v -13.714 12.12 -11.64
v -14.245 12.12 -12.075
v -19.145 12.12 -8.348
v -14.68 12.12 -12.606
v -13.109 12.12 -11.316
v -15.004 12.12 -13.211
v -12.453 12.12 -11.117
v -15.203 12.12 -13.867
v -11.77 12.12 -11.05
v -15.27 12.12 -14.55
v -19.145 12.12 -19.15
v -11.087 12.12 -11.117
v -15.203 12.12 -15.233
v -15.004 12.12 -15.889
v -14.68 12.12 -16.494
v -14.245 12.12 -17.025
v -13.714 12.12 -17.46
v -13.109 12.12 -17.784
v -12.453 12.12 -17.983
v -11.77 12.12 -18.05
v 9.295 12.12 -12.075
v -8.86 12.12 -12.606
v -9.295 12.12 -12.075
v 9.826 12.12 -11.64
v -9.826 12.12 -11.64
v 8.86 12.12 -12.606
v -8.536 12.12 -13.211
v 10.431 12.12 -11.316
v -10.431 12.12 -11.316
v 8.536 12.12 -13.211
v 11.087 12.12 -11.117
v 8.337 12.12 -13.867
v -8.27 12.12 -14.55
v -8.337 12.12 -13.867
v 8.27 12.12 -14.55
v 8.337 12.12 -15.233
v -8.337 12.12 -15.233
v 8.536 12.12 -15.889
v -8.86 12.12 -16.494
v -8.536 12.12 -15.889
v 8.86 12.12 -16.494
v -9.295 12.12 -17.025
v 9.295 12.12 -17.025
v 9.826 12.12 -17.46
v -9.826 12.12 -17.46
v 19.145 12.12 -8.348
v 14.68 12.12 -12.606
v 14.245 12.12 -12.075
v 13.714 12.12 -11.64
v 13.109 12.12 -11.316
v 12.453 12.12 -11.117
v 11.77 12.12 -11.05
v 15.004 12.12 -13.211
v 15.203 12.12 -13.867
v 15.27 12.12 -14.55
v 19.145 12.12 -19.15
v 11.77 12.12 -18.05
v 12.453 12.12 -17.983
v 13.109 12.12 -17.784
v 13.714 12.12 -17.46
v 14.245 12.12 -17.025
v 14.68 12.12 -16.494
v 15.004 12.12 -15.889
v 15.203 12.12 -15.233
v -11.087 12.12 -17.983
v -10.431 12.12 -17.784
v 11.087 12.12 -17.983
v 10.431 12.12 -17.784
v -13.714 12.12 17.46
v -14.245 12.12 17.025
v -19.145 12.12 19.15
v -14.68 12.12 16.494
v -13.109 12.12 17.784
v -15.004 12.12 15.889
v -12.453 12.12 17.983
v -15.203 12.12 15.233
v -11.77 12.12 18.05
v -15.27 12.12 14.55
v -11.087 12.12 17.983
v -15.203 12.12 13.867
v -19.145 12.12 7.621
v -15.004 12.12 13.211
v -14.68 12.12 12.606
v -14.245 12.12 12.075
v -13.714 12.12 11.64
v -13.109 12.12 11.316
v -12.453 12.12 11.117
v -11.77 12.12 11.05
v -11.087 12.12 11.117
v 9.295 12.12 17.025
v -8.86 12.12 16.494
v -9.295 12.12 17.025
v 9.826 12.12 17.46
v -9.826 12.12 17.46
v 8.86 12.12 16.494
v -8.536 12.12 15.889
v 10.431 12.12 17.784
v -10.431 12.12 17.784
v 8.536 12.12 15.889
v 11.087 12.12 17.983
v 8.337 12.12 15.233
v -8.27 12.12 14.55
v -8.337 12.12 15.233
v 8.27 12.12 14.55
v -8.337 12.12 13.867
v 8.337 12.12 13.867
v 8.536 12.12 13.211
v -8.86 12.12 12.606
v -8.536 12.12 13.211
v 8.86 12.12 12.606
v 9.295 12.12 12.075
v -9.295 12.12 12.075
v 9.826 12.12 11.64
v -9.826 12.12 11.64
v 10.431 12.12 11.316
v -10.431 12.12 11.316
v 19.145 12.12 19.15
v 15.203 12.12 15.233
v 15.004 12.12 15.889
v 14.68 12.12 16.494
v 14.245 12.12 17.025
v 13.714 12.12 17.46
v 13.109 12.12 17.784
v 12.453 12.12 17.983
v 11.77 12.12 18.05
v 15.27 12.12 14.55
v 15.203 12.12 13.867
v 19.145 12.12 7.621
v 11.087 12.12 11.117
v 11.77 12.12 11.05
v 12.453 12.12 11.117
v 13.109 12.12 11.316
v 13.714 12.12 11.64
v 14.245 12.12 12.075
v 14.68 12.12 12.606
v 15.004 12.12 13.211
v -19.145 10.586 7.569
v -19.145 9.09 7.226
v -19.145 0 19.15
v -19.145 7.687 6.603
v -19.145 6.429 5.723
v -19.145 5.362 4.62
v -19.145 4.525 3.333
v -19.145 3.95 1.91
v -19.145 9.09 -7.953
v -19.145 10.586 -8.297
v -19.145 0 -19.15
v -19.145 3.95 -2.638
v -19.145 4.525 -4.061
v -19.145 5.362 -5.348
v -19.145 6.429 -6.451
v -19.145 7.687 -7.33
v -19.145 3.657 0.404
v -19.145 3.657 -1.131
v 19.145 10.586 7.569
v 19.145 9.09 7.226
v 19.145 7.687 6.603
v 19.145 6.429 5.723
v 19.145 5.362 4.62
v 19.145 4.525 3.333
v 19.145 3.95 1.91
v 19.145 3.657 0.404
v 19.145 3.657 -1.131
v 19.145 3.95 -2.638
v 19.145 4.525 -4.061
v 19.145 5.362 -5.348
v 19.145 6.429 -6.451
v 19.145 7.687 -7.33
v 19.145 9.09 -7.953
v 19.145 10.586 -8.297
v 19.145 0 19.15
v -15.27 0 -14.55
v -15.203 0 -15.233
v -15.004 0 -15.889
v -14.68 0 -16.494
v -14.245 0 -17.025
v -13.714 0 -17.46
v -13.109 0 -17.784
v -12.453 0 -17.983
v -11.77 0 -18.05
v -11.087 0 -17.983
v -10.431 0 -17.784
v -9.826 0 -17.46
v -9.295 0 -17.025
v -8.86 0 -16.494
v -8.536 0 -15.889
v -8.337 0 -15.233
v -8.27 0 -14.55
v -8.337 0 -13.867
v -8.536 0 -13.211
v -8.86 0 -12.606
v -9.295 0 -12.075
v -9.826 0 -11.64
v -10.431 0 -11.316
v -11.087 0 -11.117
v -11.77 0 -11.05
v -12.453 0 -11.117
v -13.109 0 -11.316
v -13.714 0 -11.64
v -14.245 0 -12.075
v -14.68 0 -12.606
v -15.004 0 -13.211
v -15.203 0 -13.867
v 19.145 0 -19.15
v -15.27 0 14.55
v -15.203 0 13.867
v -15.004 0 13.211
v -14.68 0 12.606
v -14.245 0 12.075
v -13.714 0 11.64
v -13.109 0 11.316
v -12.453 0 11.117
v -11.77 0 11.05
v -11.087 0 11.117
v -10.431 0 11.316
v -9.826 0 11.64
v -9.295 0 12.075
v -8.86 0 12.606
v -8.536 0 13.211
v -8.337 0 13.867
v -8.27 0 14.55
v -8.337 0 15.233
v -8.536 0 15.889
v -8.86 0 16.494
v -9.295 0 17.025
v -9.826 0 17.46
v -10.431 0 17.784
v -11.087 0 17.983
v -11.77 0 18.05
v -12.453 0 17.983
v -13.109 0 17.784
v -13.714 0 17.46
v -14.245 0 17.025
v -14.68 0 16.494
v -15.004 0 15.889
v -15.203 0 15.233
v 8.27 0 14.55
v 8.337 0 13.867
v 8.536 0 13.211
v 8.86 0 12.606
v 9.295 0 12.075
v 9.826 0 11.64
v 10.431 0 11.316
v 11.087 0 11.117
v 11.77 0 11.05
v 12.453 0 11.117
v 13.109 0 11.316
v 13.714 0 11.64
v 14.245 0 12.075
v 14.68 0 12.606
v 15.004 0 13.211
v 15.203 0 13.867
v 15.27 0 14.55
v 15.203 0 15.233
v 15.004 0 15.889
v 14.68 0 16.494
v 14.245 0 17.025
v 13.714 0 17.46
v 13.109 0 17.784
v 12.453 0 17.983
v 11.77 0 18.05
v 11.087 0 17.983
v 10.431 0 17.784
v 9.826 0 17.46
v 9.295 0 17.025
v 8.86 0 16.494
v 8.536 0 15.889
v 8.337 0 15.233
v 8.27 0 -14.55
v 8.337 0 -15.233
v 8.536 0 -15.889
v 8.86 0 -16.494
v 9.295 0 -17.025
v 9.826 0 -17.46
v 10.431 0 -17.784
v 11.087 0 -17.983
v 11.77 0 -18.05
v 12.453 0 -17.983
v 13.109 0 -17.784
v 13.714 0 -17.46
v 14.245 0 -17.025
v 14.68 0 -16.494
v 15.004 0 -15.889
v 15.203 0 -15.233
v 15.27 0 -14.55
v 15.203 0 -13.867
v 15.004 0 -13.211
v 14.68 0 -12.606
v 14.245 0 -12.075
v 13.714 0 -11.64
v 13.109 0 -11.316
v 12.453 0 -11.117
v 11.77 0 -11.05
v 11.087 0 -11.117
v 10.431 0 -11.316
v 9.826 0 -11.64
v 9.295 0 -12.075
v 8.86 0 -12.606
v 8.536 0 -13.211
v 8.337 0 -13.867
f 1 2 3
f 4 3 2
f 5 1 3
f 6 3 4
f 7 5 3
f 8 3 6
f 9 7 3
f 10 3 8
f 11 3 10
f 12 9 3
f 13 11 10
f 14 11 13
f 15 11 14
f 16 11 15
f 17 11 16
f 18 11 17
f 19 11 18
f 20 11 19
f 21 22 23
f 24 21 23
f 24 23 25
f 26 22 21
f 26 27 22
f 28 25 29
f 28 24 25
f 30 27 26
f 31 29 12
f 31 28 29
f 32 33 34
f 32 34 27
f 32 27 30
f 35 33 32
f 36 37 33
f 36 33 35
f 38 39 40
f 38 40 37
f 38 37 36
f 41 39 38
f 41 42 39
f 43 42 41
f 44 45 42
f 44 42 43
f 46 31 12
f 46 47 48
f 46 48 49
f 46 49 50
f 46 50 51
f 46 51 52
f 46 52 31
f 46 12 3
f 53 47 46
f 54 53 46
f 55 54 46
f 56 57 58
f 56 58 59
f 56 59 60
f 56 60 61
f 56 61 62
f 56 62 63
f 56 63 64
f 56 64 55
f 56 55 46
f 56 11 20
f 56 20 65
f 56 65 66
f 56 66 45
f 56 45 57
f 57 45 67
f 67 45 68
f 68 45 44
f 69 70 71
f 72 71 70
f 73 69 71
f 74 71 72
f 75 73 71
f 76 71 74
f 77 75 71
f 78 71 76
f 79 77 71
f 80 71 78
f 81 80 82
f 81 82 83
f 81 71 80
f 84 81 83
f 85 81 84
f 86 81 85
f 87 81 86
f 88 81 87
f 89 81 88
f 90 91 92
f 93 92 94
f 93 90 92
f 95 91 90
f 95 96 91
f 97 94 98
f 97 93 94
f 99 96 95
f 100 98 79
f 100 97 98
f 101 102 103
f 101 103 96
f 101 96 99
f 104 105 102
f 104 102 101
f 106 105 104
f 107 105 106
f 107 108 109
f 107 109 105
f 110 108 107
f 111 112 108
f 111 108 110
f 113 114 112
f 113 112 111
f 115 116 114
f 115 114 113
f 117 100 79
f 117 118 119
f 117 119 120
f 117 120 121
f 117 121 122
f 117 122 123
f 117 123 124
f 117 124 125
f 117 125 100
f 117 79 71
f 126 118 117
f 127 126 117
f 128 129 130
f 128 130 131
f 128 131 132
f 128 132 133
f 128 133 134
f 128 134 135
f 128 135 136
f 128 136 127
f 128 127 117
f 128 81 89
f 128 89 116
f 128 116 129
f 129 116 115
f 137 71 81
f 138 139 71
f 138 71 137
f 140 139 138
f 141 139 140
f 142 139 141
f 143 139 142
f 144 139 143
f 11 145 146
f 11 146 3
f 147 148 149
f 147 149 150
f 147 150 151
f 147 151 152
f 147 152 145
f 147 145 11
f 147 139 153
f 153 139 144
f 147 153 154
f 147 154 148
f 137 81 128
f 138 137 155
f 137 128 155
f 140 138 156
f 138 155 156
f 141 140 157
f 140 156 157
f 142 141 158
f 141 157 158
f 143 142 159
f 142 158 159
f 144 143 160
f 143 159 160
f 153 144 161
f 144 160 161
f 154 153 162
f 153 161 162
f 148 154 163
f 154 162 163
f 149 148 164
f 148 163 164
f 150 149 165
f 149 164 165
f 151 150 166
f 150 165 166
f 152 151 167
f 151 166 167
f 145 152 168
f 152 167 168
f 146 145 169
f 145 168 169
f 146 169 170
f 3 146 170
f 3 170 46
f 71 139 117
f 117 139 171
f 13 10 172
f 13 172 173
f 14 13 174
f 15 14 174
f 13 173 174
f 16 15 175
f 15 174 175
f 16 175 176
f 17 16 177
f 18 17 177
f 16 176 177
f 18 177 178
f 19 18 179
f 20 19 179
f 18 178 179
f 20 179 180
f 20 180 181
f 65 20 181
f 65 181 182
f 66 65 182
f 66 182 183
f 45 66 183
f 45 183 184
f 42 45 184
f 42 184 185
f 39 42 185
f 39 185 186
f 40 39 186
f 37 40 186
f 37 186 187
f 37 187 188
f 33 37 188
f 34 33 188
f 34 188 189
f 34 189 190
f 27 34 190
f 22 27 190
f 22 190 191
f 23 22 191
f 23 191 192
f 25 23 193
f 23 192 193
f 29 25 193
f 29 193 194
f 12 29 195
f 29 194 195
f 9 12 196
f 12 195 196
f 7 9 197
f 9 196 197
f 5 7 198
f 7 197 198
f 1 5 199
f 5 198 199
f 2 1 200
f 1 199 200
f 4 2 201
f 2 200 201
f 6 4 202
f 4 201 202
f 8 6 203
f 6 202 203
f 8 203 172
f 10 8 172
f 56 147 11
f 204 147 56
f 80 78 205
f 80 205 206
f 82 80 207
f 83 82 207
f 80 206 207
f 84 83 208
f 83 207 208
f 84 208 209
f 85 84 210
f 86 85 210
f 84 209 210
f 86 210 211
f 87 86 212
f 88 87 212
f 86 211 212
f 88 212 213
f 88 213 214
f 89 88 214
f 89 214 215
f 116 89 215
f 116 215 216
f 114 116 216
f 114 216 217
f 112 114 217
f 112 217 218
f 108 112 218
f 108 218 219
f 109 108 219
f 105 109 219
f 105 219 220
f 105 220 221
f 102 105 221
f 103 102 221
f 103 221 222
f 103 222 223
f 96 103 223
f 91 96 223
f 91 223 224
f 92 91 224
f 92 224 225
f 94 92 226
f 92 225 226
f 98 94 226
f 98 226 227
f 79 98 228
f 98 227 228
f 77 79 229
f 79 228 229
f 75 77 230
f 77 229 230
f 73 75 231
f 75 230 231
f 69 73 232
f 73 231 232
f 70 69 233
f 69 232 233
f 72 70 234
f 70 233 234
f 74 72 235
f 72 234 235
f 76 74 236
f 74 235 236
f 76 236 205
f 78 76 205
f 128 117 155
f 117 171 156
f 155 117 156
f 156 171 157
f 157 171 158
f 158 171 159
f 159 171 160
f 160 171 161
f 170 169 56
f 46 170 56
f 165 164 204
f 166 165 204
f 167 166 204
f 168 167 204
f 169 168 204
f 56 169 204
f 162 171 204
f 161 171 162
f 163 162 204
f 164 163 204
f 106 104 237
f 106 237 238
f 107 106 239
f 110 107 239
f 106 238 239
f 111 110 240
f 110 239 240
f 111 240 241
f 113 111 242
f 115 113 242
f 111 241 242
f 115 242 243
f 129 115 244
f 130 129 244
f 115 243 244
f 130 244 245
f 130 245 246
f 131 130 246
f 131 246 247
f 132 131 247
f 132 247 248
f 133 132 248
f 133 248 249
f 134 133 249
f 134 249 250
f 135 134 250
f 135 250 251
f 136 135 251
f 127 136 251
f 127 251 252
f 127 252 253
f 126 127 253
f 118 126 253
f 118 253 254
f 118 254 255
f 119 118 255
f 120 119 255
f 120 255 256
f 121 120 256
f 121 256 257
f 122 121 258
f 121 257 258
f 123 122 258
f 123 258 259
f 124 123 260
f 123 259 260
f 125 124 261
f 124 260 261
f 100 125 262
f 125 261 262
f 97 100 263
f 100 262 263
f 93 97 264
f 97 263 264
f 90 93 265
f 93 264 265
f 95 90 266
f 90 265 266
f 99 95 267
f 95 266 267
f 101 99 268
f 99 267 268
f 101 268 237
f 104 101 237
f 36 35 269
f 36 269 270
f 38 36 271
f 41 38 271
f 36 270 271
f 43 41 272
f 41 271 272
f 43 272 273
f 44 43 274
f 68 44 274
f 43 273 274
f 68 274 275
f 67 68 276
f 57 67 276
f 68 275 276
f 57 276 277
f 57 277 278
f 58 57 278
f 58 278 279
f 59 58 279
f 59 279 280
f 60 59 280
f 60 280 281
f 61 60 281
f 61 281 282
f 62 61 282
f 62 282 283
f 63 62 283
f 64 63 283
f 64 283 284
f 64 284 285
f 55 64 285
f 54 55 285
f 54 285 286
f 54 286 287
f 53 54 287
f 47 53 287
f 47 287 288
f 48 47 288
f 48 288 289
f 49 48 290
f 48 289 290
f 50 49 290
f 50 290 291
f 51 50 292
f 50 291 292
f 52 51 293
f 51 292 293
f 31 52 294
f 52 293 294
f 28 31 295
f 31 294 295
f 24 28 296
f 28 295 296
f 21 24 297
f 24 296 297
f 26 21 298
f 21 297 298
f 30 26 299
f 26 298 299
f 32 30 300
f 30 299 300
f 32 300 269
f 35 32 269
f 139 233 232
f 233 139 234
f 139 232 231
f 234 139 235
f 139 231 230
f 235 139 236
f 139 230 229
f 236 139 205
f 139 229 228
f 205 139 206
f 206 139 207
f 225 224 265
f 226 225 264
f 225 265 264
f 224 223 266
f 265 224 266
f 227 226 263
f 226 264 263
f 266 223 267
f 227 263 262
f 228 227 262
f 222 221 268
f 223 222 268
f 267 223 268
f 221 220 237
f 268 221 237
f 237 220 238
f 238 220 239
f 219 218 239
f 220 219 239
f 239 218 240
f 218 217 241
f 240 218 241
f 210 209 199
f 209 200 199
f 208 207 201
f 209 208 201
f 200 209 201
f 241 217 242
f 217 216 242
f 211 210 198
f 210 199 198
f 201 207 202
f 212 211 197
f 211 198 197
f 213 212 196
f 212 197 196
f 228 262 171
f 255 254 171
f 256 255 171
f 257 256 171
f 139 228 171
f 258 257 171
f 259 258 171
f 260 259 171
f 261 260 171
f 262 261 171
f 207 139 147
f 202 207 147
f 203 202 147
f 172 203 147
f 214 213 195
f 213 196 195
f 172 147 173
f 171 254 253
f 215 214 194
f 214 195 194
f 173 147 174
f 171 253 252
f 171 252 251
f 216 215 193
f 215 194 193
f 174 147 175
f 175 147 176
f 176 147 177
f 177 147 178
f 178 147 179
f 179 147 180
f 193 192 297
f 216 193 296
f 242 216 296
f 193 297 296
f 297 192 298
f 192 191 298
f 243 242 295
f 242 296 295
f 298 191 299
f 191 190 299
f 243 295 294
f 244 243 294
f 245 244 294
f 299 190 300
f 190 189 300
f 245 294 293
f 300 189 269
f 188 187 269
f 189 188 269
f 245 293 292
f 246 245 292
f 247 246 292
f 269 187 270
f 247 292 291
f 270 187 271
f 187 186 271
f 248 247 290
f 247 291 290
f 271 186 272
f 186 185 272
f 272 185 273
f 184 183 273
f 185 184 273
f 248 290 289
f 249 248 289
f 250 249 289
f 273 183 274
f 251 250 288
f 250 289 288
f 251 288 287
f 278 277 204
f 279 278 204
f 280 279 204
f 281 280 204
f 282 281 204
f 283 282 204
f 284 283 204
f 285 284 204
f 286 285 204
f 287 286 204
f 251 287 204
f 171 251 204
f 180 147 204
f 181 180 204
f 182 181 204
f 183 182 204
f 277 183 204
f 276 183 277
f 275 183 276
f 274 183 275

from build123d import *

# Parameters (mm, degrees)
SKETCH1_W                            = 38.29
SKETCH1_H                            = 38.3
BOSS_EXTRUDE1_DEPTH                  = 12.12
SKETCH2_R                            = 8
CUT_EXTRUDE1_DEPTH                   = 45.494280531
M8X1_0_TAPPED_HOLE2_D                = 7
MIRROR1_AT_THE_SECOND_PLANE_COPY_1_D = 7


with BuildPart() as part:
    # Sketch1 → Boss-Extrude1 (new body)
    with BuildSketch(Plane(origin=(0, 0, 0), x_dir=(1, 0, 0), z_dir=(0, 1, 0))):
        Rectangle(SKETCH1_W, SKETCH1_H)
    extrude(amount=BOSS_EXTRUDE1_DEPTH)

    # Sketch2 → Cut-Extrude1 (cut, through all)
    with BuildSketch(Plane(origin=(19.145, 0, 0), x_dir=(0, 0, -1), z_dir=(1, 0, 0))):
        with Locations((0.363834185, 11.62)):
            Circle(SKETCH2_R)
    extrude(amount=-CUT_EXTRUDE1_DEPTH, mode=Mode.SUBTRACT)

    # M8x1.0 Tapped Hole2 (through all)
    with Locations(Plane(origin=(0, 12.12, 0), x_dir=(1, 0, 0), z_dir=(0, 1, 0))):
        with Locations((-11.77, 14.55), (11.77, 14.55), (-11.77, -14.55), (11.77, -14.55)):
            m8x1_0_tapped_hole2 = Hole(M8X1_0_TAPPED_HOLE2_D / 2)

    # Mirror1: M8x1.0 Tapped Hole2 across plane
    add(m8x1_0_tapped_hole2.mirror(Plane.XY), mode=Mode.SUBTRACT)

    # Mirror1 at the second plane: M8x1.0 Tapped Hole2 across plane
    add(m8x1_0_tapped_hole2.mirror(Plane(origin=(0, 0, 0), x_dir=(0, 0, 1), z_dir=(1, 0, 0))), mode=Mode.SUBTRACT)

    # Mirror1 at the second plane copy 1 (through all)
    with Locations(Plane(origin=(0, 12.12, 0), x_dir=(-1, 0, 0), z_dir=(0, 1, 0))):
        with Locations((-11.77, 14.55), (11.77, 14.55), (-11.77, -14.55), (11.77, -14.55)):
            Hole(MIRROR1_AT_THE_SECOND_PLANE_COPY_1_D / 2)


solid = part.part
